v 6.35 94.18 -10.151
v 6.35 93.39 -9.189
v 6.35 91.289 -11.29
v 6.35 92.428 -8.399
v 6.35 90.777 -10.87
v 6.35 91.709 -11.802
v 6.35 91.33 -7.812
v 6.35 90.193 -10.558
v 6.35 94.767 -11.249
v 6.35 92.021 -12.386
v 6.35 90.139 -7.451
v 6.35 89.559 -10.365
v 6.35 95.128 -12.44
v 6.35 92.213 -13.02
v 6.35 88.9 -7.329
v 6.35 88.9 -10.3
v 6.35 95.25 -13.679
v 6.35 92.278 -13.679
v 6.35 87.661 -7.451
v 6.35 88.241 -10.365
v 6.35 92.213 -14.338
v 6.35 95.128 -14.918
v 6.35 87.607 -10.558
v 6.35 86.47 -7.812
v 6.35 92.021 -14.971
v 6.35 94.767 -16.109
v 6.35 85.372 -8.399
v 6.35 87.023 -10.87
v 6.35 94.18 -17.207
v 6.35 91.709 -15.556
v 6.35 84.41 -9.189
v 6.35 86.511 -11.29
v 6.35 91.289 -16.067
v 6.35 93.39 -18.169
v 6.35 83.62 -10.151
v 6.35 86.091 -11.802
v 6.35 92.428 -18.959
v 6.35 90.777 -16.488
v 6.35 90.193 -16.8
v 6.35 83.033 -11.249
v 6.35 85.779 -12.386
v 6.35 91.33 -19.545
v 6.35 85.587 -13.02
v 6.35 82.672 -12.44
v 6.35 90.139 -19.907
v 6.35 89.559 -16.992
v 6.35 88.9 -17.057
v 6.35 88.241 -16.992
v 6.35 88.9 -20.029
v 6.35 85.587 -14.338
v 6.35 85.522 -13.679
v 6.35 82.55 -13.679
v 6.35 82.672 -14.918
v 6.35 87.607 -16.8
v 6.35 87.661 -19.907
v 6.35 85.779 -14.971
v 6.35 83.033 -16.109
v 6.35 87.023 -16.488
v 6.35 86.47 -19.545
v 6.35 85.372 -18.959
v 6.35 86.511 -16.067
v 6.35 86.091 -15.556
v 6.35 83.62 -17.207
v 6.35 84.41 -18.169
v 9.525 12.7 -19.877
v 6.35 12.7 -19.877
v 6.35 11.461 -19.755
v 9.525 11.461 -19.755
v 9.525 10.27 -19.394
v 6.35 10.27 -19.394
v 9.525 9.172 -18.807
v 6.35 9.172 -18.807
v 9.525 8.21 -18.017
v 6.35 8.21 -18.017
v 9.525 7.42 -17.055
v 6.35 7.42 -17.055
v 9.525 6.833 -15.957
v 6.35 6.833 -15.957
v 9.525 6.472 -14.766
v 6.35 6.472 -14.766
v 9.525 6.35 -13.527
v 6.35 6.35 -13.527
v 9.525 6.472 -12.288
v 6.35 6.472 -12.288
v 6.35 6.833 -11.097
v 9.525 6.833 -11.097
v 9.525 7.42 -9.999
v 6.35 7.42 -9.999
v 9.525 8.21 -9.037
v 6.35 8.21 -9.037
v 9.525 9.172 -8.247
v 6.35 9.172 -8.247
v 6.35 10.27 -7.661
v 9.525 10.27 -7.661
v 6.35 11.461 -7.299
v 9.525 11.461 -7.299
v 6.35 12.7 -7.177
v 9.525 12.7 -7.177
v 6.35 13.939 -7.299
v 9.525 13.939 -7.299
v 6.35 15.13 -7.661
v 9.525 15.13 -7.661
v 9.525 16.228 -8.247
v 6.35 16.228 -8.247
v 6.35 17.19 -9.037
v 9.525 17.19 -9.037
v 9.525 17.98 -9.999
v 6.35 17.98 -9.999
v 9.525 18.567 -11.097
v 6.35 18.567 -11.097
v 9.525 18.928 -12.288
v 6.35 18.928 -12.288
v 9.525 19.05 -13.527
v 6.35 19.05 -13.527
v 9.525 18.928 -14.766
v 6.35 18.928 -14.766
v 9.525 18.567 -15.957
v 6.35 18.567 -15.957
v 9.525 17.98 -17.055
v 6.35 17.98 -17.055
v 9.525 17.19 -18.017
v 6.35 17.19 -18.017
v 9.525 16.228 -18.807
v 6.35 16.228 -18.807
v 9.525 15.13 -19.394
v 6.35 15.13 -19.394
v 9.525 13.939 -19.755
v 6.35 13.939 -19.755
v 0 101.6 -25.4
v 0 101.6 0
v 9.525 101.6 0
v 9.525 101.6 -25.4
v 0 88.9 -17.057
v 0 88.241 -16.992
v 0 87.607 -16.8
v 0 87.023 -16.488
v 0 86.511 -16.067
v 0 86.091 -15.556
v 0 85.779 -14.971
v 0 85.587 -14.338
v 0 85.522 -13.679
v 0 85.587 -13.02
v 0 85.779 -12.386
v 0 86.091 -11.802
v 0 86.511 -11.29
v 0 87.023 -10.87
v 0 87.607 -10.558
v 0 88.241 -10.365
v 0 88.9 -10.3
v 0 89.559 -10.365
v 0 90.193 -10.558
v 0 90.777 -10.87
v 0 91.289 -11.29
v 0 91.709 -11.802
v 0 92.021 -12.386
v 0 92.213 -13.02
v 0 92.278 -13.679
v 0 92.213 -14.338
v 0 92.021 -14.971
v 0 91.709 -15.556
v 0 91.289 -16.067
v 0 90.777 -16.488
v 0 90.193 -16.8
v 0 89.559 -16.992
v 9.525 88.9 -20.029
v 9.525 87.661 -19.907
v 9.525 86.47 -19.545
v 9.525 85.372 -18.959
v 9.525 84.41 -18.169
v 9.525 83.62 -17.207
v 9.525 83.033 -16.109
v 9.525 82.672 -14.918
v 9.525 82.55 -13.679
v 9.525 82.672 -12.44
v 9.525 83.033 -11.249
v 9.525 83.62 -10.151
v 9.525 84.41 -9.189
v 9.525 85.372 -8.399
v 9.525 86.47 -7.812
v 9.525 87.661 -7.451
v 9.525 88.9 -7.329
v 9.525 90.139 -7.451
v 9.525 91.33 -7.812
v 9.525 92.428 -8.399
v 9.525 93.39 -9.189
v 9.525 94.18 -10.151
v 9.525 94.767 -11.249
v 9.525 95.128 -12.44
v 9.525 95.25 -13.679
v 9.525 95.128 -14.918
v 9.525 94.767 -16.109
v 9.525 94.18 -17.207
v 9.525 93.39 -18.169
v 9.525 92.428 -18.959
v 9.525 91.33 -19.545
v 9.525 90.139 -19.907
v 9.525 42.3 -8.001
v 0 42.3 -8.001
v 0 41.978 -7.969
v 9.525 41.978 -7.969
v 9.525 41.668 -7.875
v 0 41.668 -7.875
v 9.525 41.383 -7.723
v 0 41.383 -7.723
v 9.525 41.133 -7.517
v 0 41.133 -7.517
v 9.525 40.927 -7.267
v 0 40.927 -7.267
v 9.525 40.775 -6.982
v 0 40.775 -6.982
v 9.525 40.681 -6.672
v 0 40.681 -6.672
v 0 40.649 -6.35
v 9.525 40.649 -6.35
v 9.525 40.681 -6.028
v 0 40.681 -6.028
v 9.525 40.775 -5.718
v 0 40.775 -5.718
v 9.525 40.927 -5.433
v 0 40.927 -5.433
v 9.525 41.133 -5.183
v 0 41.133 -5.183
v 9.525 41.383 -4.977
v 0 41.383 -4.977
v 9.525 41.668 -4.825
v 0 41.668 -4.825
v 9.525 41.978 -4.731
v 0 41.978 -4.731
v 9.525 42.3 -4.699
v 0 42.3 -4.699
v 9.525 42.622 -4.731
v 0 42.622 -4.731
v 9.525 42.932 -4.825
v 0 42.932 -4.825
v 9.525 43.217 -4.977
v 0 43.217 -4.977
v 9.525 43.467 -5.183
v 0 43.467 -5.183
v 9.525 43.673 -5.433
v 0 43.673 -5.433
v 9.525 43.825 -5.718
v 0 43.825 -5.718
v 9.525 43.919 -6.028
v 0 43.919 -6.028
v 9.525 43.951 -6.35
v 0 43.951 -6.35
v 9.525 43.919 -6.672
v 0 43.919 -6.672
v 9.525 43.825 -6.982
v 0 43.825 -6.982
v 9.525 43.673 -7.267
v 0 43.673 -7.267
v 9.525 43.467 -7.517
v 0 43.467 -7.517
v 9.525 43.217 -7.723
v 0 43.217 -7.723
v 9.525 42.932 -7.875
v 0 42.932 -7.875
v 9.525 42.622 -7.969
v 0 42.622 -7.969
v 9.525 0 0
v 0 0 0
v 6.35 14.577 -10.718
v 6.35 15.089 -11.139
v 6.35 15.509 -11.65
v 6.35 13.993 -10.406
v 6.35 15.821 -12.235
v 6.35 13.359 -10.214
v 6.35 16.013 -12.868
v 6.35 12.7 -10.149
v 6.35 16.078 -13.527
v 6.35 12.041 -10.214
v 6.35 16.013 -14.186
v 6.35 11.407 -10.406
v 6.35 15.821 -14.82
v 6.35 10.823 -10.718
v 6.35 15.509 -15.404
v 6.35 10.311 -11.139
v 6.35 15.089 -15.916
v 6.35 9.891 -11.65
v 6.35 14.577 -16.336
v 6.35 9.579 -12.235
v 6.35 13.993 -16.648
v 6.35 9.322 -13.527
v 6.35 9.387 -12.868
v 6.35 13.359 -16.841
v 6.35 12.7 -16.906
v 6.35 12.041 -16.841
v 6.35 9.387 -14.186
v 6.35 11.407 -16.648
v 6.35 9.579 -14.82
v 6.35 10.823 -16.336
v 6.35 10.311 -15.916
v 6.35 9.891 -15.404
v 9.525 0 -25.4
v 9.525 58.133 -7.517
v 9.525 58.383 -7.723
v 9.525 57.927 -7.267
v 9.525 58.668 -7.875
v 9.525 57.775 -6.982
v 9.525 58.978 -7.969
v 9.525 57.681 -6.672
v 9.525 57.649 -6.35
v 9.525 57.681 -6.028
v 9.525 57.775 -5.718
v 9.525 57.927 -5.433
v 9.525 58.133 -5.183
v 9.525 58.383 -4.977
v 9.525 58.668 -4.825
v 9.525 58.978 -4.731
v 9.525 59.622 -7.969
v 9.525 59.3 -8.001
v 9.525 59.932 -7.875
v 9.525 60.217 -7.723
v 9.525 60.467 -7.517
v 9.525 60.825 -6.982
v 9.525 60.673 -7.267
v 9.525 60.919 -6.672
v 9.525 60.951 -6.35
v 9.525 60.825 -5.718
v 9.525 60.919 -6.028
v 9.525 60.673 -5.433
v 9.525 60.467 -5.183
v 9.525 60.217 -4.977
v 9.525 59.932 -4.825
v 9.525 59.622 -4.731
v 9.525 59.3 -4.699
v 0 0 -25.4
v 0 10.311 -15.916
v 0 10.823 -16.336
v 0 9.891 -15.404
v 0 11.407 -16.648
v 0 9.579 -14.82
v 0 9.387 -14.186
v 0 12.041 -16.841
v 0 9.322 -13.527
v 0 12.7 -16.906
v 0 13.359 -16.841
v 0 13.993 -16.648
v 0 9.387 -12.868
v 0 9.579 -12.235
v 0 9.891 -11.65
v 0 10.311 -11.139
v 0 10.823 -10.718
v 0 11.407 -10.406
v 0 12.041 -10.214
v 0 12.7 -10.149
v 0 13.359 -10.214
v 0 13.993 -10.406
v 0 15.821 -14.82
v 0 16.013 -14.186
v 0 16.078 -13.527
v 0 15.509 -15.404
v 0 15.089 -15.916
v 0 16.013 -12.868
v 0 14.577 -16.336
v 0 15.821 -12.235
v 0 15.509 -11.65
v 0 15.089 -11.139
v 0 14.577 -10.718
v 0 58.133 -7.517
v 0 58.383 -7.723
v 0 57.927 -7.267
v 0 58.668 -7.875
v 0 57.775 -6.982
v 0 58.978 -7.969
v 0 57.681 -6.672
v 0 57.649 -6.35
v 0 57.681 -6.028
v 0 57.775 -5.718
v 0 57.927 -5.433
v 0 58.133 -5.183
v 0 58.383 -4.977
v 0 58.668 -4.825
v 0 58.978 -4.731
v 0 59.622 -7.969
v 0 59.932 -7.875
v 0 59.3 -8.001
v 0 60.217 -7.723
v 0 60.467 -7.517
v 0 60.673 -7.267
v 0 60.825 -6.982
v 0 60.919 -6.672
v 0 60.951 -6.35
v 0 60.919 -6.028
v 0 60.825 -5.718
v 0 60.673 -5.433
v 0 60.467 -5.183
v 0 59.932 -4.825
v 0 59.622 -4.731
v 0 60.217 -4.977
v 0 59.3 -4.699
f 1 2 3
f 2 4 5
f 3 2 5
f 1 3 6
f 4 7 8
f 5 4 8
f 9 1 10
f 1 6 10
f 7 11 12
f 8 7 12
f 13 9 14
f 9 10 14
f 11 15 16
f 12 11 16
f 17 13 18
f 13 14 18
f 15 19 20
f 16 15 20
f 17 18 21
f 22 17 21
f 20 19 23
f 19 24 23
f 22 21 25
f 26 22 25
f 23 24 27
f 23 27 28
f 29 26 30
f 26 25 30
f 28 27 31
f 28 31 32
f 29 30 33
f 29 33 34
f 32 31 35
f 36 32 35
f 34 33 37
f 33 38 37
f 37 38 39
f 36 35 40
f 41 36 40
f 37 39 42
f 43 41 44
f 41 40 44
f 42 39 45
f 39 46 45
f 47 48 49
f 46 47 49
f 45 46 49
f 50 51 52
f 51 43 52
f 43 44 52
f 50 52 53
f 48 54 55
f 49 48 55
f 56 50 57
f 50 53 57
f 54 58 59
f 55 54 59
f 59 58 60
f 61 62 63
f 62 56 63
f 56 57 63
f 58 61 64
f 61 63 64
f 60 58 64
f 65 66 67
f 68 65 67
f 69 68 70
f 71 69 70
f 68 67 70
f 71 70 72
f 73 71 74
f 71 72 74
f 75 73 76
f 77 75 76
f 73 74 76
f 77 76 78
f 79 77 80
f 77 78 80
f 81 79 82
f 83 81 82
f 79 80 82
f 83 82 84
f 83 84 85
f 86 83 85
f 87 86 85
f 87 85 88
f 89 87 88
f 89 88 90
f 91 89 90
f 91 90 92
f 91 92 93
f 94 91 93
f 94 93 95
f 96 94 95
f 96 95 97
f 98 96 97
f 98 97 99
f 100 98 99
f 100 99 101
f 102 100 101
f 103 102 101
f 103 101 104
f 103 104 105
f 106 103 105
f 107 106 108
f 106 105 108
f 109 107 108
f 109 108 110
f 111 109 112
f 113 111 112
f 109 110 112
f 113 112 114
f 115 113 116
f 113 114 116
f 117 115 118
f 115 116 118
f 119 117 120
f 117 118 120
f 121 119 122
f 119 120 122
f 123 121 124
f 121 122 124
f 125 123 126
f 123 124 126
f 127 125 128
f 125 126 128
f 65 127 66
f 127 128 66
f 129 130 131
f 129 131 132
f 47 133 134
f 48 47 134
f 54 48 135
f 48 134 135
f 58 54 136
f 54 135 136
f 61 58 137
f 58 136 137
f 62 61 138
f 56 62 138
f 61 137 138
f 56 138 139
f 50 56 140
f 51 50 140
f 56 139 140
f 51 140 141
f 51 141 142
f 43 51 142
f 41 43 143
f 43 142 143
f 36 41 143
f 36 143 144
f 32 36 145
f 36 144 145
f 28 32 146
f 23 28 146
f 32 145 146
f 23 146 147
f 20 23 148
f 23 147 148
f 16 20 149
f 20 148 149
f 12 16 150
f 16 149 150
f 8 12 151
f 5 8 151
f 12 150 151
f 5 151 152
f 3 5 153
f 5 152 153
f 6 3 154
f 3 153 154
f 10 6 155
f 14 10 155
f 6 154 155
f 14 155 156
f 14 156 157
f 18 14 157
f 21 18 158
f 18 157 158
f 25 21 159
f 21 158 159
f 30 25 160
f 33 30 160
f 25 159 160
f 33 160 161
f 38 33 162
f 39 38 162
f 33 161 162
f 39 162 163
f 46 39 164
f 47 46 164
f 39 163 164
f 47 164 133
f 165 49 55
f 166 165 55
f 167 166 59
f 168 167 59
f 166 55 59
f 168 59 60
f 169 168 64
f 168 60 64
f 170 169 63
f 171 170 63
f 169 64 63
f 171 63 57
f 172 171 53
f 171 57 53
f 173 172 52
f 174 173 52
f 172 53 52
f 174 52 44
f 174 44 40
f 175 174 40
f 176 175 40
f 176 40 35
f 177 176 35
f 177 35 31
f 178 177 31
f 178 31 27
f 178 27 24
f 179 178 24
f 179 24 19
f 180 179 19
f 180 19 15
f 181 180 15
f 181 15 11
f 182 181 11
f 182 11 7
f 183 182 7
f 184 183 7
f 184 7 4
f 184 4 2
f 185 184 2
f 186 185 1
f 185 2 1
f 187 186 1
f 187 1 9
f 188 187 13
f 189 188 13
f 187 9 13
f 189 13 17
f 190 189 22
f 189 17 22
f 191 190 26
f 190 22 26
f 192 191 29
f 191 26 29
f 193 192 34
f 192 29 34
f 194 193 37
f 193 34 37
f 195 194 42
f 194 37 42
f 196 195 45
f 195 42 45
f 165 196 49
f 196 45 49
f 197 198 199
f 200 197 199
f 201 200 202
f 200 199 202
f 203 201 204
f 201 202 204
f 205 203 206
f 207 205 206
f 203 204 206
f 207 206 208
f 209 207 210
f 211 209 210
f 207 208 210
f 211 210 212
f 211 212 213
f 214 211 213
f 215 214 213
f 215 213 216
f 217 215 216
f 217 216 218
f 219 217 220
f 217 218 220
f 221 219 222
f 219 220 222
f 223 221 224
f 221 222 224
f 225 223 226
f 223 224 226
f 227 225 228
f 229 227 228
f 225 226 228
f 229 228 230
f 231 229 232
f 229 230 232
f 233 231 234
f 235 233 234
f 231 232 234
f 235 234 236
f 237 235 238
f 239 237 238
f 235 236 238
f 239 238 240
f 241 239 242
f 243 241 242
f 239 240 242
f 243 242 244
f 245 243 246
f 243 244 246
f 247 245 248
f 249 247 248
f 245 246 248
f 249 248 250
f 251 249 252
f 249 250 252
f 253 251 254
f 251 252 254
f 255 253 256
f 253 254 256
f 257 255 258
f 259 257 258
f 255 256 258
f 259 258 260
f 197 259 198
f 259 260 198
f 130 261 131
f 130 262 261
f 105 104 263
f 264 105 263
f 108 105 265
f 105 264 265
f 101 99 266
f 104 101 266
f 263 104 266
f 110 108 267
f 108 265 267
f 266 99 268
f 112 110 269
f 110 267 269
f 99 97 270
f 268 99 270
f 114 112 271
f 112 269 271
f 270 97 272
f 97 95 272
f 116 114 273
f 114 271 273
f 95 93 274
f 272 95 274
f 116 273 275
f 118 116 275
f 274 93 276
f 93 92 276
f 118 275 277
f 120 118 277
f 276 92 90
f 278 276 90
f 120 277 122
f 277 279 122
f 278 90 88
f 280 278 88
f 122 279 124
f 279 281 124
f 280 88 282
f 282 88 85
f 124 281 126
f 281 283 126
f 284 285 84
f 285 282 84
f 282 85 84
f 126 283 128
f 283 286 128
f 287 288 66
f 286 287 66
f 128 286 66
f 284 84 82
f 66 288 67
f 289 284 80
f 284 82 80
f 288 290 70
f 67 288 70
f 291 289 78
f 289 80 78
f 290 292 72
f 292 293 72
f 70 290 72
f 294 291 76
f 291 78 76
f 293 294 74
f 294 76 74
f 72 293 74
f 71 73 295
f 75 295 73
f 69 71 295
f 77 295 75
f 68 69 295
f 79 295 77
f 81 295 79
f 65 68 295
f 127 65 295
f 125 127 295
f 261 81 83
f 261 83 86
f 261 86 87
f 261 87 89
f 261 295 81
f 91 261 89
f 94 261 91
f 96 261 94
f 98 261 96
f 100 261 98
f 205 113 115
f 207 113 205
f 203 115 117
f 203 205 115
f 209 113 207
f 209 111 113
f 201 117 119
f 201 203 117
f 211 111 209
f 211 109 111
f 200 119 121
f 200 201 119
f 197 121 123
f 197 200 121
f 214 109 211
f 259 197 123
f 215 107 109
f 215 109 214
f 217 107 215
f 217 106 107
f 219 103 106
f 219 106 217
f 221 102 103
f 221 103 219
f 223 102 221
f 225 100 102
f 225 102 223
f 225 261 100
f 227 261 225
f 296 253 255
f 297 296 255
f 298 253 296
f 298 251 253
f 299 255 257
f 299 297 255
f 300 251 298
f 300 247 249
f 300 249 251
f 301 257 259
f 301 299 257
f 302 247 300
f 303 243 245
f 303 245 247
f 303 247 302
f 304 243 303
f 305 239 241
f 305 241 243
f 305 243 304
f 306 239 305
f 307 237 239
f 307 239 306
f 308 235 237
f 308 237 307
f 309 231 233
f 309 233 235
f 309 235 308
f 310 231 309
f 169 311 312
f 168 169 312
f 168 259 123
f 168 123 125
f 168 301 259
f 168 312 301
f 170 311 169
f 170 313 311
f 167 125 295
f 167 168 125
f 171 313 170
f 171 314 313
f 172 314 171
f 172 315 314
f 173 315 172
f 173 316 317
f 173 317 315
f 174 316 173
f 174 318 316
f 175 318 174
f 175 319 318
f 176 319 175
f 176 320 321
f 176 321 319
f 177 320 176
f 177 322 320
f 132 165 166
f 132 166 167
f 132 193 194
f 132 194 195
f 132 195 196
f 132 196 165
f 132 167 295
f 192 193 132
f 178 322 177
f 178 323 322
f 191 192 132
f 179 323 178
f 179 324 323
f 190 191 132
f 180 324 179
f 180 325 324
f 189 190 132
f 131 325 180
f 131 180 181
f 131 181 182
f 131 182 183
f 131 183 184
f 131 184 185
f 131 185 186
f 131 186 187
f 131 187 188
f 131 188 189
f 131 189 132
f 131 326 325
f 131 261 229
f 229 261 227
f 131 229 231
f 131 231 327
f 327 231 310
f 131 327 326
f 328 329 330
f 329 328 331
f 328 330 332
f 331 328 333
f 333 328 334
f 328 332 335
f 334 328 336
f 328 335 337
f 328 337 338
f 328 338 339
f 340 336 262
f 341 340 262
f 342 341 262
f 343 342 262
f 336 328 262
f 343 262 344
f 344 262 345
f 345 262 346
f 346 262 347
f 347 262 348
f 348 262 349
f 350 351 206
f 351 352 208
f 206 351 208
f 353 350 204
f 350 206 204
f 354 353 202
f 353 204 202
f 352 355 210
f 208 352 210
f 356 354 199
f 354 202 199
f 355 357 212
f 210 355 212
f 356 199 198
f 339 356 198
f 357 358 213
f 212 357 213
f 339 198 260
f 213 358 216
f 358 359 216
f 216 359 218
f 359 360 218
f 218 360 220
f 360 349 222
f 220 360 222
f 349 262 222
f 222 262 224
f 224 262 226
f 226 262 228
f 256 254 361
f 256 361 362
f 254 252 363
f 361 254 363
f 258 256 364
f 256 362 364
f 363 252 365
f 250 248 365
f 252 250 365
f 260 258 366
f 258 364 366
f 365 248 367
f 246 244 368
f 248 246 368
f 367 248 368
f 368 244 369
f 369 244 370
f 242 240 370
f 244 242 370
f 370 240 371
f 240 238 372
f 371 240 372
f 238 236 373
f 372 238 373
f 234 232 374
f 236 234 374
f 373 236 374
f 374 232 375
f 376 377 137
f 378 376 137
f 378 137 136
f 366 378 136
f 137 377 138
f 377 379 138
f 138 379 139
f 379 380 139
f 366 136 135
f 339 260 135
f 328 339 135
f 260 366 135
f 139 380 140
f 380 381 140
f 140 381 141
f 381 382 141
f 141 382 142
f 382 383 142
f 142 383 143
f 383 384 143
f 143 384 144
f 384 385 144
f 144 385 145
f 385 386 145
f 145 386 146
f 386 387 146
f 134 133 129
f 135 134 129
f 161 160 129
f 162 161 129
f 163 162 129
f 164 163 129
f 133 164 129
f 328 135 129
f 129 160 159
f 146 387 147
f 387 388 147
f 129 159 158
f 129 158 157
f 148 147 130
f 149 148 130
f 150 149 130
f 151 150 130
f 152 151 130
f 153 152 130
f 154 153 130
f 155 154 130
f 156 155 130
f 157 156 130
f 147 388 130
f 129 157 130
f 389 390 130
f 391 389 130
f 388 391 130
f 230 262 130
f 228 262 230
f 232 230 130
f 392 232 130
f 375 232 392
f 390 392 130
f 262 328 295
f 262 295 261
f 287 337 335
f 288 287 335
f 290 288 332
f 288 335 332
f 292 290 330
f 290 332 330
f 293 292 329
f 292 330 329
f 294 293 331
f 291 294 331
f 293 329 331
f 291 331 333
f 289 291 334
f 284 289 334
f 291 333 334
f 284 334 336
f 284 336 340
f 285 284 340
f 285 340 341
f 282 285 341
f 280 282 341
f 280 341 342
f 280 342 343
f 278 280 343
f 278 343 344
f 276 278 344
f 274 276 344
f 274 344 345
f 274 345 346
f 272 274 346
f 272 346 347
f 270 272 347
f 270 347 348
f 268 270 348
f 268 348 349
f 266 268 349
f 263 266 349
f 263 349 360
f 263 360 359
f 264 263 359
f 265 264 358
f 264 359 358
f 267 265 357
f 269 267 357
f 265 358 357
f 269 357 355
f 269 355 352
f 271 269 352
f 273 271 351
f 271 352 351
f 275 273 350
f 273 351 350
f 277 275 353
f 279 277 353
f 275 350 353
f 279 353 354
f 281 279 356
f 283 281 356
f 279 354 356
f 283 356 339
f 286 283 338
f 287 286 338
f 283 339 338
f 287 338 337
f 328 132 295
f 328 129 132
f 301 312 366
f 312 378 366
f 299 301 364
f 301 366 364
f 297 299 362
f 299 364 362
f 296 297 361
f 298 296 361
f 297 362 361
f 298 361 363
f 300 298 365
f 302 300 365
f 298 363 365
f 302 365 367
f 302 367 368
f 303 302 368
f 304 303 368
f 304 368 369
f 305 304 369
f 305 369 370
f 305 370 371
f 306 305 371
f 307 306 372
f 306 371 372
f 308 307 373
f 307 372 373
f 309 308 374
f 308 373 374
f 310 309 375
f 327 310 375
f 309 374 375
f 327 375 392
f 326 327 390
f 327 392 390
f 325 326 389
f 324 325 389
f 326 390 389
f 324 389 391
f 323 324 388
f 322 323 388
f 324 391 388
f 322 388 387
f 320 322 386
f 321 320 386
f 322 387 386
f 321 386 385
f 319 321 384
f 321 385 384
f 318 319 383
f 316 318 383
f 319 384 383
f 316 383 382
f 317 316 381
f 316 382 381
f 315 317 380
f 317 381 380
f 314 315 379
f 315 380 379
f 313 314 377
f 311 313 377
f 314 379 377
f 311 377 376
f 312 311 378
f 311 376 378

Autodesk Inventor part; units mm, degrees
ref_plane "YZ Plane" through (0, 0, 0) normal (1, 0, 0) x (0, 1, 0)
ref_plane "XZ Plane" through (0, 0, 0) normal (0, 1, 0) x (-1, 0, 0)
ref_plane "XY Plane" through (0, 0, 0) normal (0, 0, 1) x (1, 0, 0)
sketch "Sketch1" plane through (0, 0, 0) normal (1, 0, 0) x (0, 1, 0)
  line L0 (0, 0) -> (101.6, 0)
  line L1 (101.6, 0) -> (101.6, -25.4)
  line L2 (101.6, -25.4) -> (0, -25.4)
  line L3 (0, -25.4) -> (0, 0)
  point P0 (95.25, -12.7)
  point P1 (6.35, -12.7)
  dimension "d0" = 25.4
  dimension "d1" = 101.6
  dimension "d4" = 6.35
  dimension "d5" = 12.7
  dimension "d6" = 6.35
extrude "Extrusion1" add sketch "Sketch1" along normal blind 9.525
sketch "Sketch2" plane through (9.525, 0, 0) normal (1, 0, 0) x (0, 0, -1)
  line L0 (25.4, 101.6) -> (0, 101.6) projected
  point P0 (0, 0)
  point P1 (13.6787, 88.9)
  dimension "d22" = 12.7
hole "Hole1" at (9.525, 88.9, -13.6787) direction (-1, 0, 0) diameter 6.7564 end through all counterbore diameter 12.7 counterbore depth 3.175
sketch "Sketch3" plane through (9.525, 0, 0) normal (1, 0, 0) x (0, 0, -1)
  line L0 (0, 0) -> (25.4, 0) projected
  point P0 (13.5273, 12.7)
  dimension "d21" = 12.7
hole "Hole2" at (9.525, 12.7, -13.5273) direction (-1, 0, 0) diameter 6.7564 end through all counterbore diameter 12.7 counterbore depth 3.175
sketch "Sketch4" plane through (9.525, 0, 0) normal (1, 0, 0) x (0, 0, -1)
  line L0 (0, 101.6) -> (0, 0) projected
  line L1 (25.4, 101.6) -> (0, 101.6) projected
  point P0 (6.35, 59.3)
  dimension "d30" = 6.35
  dimension "d31" = 42.3
hole "Hole3" at (9.525, 59.3, -6.35) direction (-1, 0, 0) diameter 3.302 end through all thread size "8-32 UNC" class "2B" standard "ANSI Unified Screw Threads"
sketch "Sketch5" plane through (9.525, 0, 0) normal (1, 0, 0) x (0, 0, -1)
  line L0 (0, 0) -> (25.4, 0) projected
  line L1 (0, 101.6) -> (0, 0) projected
  point P0 (6.35, 42.3)
  dimension "d39" = 42.3
  dimension "d40" = 6.35
hole "Hole4" at (9.525, 42.3, -6.35) direction (-1, 0, 0) diameter 3.302 end through all thread size "8-32 UNC" class "2B" standard "ANSI Unified Screw Threads"
properties part number "NeedleValvePanel V1"
